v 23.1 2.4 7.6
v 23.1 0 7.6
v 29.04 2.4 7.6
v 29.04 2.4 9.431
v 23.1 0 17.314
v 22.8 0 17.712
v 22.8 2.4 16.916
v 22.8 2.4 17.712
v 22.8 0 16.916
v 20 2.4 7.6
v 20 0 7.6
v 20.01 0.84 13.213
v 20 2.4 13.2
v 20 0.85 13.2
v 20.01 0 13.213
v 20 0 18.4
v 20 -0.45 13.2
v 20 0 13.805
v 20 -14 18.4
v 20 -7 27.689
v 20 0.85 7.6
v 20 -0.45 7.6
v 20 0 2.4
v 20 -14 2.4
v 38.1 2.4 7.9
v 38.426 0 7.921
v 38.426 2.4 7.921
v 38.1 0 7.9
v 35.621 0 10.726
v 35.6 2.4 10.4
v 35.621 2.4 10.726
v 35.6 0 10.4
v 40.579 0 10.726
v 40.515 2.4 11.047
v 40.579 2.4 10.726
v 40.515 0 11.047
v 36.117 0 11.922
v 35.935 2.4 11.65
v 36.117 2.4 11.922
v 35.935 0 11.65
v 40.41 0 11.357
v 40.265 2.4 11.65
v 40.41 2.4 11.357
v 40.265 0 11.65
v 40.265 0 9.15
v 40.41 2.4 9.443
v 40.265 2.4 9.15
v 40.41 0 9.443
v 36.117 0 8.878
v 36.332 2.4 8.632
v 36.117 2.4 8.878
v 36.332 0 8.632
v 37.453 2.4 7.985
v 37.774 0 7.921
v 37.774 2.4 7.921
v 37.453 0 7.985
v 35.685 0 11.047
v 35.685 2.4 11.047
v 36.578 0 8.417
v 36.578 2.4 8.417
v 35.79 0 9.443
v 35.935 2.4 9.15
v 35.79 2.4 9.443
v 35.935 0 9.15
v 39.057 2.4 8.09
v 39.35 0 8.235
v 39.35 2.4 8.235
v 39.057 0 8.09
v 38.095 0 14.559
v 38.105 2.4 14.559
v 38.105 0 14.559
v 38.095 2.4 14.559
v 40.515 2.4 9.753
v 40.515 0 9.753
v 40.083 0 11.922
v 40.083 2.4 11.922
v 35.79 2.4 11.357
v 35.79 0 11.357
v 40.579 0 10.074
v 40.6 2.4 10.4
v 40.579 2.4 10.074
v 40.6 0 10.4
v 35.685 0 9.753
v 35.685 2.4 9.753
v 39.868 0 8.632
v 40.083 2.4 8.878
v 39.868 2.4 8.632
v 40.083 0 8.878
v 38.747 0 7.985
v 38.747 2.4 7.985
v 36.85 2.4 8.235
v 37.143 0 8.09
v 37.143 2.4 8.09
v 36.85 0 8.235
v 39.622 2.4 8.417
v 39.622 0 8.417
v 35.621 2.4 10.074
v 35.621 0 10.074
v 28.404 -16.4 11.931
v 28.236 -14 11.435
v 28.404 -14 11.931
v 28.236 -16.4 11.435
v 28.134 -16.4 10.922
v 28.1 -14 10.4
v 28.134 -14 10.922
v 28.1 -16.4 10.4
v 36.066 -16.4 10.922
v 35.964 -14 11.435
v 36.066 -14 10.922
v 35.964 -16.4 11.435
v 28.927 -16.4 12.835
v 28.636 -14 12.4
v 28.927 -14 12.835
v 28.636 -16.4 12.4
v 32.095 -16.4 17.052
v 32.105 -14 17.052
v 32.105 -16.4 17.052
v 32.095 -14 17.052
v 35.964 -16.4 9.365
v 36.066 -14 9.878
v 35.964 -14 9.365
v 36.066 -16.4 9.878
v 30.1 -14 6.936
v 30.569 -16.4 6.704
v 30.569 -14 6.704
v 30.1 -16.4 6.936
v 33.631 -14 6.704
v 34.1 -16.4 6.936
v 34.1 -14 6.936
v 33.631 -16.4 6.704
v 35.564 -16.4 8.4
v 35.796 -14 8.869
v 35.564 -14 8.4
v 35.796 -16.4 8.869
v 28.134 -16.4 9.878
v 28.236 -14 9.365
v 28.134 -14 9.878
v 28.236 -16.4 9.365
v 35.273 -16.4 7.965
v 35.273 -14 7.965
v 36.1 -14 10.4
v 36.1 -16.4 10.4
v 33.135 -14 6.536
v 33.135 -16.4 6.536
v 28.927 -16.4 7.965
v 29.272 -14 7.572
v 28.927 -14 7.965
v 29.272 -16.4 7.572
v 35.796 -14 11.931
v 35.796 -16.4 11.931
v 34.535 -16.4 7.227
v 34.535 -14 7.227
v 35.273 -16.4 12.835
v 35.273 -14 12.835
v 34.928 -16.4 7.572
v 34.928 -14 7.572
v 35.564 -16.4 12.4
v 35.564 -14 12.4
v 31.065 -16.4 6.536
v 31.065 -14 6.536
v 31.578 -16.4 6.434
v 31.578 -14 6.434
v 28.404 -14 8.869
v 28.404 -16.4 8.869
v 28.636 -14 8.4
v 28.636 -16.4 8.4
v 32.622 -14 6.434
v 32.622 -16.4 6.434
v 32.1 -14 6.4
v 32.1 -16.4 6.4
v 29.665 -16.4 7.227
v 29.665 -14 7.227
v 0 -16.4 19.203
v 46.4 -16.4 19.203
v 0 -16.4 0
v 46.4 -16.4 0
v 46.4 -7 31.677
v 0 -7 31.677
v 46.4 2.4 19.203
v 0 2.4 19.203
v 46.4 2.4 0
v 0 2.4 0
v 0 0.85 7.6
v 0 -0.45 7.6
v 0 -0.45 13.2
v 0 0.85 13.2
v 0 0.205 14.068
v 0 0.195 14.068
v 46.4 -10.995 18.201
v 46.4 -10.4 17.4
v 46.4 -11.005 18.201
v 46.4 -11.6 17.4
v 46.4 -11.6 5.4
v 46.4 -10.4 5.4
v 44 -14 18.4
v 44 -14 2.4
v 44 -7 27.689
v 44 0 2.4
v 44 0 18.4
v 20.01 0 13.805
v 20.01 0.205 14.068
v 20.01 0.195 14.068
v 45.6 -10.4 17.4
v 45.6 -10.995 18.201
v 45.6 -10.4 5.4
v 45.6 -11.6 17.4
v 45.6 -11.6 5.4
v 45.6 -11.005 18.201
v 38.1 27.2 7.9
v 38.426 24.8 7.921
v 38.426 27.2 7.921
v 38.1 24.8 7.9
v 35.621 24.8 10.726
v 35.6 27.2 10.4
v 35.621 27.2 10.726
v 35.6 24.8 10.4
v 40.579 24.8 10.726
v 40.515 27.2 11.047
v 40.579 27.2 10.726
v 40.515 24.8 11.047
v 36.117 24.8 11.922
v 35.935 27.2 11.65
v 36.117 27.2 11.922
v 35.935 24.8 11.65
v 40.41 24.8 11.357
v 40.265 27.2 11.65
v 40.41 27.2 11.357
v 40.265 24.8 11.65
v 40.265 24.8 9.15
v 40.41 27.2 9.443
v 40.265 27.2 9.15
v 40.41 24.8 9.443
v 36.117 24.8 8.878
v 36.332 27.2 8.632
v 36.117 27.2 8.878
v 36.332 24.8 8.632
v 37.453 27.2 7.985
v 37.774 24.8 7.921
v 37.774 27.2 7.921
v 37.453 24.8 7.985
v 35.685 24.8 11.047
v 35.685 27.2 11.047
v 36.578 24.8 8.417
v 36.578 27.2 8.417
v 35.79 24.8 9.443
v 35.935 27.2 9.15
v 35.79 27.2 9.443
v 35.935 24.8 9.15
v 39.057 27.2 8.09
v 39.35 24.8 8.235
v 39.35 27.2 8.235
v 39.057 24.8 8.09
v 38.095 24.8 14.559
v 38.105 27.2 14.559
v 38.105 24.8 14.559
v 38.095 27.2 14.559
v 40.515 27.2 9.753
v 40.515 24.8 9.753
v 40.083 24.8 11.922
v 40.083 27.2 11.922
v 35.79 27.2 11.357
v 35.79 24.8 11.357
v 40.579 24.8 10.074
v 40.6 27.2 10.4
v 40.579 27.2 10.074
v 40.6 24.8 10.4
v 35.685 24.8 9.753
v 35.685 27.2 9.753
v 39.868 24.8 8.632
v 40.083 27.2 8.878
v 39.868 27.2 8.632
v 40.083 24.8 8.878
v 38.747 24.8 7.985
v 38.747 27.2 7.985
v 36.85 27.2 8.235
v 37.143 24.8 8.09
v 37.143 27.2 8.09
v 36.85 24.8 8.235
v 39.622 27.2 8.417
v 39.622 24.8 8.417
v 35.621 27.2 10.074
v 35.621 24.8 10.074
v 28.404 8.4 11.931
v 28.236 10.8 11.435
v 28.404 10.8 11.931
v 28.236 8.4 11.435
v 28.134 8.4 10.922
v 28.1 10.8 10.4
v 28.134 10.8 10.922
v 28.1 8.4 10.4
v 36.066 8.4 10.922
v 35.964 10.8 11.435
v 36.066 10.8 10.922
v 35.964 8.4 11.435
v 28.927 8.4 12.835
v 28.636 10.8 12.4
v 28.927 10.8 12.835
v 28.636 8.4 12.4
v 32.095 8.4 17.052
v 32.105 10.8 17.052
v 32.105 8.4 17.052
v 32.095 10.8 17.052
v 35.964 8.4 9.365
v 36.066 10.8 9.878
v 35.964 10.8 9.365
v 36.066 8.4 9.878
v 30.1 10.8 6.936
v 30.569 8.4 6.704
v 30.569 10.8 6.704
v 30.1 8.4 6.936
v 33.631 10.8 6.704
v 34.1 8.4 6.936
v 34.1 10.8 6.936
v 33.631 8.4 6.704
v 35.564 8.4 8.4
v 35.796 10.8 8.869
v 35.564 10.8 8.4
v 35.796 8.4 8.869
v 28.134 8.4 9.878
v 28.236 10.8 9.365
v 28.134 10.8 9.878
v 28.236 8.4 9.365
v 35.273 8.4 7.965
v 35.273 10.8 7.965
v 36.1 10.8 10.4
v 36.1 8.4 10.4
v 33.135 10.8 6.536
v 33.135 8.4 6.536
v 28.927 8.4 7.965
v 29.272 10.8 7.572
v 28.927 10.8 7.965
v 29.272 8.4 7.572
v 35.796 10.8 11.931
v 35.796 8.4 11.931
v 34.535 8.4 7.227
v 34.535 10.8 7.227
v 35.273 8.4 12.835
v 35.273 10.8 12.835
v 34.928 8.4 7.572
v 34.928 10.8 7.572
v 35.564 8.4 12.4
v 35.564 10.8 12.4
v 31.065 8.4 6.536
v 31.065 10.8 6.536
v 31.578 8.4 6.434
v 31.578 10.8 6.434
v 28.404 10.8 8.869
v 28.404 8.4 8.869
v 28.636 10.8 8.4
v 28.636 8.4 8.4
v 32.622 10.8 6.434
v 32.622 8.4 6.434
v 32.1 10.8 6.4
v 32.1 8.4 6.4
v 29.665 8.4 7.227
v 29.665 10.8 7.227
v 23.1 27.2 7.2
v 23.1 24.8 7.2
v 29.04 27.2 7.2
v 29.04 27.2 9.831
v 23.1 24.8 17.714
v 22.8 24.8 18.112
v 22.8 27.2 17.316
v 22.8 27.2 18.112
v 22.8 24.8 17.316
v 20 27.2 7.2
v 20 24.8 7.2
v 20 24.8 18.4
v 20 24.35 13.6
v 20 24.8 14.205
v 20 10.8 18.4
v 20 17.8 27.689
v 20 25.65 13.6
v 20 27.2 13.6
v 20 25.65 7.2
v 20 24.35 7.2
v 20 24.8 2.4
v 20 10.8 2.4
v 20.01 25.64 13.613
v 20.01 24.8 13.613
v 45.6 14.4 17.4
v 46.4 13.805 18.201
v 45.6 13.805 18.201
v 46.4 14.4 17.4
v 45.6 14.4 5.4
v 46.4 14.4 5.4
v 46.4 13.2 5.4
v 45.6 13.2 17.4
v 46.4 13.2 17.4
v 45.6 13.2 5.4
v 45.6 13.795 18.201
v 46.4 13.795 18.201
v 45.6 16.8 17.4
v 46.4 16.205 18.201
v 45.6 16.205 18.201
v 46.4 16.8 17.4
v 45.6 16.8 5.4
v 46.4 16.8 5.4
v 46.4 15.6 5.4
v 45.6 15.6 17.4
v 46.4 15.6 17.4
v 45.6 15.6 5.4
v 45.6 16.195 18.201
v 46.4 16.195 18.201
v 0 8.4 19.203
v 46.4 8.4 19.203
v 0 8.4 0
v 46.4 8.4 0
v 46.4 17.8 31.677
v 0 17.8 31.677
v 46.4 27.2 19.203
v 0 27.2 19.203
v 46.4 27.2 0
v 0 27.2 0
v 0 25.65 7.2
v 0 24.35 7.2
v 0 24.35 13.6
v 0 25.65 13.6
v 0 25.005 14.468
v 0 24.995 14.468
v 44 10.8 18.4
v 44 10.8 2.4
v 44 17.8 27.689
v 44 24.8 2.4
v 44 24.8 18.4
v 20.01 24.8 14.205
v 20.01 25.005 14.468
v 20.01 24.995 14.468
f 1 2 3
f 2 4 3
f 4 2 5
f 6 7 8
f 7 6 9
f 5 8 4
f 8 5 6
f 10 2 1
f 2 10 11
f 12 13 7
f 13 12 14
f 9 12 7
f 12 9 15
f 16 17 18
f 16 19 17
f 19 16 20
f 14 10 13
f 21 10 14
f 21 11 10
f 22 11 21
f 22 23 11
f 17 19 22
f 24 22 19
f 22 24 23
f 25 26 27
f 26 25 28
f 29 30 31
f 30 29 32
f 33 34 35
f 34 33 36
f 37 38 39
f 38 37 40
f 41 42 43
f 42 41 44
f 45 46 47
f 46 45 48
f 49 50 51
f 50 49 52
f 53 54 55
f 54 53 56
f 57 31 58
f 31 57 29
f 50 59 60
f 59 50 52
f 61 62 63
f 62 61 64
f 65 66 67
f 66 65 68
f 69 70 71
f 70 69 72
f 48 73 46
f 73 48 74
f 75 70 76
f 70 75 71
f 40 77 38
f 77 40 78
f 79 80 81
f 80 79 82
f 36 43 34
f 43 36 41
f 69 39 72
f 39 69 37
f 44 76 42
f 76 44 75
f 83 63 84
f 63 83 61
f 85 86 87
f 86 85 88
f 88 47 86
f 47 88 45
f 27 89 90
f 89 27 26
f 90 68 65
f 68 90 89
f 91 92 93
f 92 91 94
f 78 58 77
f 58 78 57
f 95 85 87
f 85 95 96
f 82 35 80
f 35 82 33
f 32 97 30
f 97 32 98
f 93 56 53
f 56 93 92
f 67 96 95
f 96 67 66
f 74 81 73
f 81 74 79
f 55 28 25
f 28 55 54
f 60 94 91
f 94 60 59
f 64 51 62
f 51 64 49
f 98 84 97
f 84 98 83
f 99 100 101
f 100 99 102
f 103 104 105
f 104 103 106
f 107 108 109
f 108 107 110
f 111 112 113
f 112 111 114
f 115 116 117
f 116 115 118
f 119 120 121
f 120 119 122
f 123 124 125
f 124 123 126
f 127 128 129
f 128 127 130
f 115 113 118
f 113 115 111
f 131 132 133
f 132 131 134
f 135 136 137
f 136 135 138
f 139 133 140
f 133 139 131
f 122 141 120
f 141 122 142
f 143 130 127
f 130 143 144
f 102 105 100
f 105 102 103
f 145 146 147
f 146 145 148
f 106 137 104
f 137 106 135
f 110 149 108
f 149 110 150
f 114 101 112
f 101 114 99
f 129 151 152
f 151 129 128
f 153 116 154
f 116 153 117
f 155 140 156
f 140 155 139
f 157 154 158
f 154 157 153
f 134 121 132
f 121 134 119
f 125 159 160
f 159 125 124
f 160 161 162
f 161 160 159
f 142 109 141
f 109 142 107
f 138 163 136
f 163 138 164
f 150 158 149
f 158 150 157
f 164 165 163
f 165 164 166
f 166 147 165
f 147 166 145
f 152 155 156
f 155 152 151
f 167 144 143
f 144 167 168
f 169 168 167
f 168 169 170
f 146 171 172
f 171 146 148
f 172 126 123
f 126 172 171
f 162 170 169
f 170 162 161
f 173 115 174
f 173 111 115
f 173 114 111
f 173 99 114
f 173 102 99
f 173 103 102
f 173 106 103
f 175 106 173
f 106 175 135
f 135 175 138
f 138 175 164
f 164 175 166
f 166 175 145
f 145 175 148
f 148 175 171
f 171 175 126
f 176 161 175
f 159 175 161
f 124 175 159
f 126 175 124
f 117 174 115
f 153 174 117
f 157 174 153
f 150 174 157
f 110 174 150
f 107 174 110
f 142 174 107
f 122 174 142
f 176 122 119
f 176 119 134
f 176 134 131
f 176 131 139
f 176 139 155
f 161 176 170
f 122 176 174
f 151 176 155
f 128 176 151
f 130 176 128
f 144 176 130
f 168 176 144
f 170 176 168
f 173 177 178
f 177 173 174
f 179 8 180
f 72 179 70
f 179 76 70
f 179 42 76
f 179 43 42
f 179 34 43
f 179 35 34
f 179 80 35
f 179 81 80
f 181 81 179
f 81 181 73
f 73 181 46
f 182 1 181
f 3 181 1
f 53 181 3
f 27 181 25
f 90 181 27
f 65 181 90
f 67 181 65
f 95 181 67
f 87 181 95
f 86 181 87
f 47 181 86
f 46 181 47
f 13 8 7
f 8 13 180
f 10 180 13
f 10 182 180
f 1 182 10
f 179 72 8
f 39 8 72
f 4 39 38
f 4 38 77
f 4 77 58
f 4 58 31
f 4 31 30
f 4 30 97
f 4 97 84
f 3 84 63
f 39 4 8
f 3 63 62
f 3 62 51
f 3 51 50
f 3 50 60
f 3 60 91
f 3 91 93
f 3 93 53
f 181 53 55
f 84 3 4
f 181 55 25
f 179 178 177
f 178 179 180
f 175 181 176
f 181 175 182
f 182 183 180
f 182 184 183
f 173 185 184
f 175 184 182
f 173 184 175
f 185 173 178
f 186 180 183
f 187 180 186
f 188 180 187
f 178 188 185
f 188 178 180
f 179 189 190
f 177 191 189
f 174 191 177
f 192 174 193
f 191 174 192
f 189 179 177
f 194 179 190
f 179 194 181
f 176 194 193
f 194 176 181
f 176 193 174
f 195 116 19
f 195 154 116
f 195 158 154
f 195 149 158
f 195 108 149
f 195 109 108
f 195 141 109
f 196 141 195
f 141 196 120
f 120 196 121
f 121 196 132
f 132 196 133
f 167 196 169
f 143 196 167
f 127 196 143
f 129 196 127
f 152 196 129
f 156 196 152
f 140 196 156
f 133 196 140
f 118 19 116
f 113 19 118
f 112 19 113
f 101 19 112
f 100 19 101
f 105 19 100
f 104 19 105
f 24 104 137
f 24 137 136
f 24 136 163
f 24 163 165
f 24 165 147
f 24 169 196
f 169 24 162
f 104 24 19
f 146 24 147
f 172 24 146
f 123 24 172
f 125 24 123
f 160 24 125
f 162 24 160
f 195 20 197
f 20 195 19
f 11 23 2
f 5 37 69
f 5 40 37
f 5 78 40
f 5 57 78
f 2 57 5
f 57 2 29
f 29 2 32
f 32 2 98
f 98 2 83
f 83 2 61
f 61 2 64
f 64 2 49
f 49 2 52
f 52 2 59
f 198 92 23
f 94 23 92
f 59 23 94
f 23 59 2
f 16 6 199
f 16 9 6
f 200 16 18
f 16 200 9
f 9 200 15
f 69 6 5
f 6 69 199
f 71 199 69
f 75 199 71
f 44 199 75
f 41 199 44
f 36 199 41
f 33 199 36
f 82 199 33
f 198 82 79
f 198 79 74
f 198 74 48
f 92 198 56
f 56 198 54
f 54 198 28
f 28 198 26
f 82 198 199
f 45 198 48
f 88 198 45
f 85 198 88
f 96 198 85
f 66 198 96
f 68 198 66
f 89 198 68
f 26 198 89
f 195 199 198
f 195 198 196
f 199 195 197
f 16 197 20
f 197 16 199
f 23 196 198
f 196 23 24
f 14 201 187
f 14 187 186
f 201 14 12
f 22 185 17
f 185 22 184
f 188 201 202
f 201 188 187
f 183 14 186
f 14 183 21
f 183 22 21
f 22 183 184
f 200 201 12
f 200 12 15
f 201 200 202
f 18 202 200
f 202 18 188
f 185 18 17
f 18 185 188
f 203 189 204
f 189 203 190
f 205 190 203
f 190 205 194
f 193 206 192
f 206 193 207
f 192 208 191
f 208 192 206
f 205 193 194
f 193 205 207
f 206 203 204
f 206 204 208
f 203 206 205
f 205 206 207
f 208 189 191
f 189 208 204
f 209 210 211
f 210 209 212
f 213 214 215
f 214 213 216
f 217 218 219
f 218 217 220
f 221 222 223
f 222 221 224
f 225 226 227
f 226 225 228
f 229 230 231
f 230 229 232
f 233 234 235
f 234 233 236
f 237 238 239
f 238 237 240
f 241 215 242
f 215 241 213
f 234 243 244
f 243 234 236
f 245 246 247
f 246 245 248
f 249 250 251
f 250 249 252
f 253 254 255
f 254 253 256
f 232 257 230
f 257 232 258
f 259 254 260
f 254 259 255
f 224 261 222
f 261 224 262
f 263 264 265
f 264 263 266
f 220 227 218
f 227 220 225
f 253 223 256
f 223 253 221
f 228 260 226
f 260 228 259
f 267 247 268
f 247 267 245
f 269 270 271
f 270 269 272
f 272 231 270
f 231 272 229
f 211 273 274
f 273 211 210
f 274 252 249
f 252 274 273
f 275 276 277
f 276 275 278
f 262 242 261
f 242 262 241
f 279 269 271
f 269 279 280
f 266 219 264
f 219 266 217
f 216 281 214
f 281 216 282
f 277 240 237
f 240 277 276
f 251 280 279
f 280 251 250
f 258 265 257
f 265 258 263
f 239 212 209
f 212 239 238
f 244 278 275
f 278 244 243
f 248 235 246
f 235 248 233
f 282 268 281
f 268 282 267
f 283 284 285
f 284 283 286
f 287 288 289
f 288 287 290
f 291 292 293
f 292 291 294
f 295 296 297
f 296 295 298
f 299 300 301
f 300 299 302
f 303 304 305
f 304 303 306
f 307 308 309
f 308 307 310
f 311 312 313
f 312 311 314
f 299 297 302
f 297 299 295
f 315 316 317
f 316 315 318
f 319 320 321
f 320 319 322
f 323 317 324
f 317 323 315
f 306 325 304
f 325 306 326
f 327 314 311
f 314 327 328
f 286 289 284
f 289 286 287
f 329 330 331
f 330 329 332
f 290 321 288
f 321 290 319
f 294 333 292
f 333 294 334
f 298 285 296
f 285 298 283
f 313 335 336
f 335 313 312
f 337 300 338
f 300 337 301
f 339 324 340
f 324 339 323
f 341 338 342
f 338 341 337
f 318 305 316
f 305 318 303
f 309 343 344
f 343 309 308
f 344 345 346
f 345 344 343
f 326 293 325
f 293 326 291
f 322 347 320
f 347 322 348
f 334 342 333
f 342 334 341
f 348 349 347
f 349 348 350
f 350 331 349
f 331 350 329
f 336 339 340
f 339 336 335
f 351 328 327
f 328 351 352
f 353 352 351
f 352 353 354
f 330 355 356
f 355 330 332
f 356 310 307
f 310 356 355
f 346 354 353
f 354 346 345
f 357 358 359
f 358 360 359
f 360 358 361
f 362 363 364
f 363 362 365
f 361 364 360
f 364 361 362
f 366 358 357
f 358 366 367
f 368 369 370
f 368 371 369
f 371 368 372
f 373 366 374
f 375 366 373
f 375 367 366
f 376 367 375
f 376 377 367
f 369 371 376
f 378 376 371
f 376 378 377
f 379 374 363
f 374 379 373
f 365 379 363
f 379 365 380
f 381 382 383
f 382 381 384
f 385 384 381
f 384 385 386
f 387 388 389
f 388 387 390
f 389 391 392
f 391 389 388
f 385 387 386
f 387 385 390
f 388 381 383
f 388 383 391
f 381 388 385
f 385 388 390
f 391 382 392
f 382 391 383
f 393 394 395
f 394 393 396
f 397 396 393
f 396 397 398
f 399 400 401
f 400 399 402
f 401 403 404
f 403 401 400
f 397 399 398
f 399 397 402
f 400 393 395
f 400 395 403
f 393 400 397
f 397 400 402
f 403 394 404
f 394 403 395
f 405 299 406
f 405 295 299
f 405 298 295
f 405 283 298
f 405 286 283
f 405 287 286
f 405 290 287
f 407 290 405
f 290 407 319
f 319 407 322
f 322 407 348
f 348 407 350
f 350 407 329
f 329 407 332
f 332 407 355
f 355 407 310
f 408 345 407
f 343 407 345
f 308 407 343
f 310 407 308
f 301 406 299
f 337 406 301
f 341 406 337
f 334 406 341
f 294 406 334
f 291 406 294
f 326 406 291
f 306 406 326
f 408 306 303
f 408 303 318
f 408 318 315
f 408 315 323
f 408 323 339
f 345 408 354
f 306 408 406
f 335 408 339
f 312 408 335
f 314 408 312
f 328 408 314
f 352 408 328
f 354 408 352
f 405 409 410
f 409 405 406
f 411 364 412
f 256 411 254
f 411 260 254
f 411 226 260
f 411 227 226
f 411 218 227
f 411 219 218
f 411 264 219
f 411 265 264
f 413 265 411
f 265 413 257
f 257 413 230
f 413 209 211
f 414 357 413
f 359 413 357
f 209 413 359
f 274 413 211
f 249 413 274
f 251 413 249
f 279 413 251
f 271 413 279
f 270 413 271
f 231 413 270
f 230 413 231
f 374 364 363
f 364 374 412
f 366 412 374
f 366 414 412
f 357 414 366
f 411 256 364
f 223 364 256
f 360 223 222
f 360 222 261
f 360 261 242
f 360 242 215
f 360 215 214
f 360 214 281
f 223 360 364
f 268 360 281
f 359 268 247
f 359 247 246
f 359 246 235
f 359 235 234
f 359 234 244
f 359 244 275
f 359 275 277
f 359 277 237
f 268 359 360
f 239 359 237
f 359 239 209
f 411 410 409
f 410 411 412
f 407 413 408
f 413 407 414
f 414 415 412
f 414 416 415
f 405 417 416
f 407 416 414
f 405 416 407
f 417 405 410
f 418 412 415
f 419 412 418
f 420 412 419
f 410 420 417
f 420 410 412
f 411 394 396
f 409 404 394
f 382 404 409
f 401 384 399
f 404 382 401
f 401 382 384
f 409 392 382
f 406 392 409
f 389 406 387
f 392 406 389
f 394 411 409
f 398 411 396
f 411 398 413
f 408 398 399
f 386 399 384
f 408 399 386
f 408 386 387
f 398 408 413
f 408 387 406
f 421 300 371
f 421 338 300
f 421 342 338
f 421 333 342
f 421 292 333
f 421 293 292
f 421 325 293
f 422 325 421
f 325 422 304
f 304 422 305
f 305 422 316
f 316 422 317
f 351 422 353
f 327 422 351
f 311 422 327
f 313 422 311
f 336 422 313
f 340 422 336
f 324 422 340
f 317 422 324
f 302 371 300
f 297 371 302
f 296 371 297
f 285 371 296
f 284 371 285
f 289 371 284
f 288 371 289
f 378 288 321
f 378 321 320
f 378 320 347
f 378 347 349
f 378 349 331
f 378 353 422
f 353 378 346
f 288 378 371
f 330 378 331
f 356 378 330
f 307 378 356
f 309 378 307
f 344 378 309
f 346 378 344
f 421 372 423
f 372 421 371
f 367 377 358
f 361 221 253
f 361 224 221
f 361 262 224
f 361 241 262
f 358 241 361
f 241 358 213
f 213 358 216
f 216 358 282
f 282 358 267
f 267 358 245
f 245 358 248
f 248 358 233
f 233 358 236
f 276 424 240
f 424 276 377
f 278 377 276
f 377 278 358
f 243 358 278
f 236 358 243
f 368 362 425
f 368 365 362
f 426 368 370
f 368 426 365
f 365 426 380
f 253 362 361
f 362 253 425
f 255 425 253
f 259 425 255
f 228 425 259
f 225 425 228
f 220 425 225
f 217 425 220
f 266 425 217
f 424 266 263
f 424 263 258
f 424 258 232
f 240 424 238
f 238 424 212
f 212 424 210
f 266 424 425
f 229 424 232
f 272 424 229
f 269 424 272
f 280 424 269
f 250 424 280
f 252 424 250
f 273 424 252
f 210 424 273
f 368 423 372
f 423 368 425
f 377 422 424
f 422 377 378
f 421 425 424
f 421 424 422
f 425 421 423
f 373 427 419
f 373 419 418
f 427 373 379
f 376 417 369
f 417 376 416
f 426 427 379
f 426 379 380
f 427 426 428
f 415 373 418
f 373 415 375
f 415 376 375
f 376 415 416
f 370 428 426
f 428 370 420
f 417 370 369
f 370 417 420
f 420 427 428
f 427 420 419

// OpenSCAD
// Ocarina voicing whistle v2 (2026-11-19): a narrower window. Scott said yes to one more test.
// Whistle 2 of v1 (windway 1.3 mm) measured a window term of 4.88 mm (twice, from Scott's two
// recordings), and with the hole end correction measured at 2.1-2.5, the 12-hole ocarina's
// two thumb holes came out 11.1 and 13.5 mm: too big for a finger (BRIEF.md). Every hole
// scales with the window term, and 3.5 mm brings every hole under 10.5. The window term is
// set by the jet's width, so these two whistles narrow it, everything else as v1 whistle 2:
//   one notch: jet 5.6 mm wide (v1: 8.0), about 30% narrower, aiming at a window term of 3.4
//   two notches: jet 6.4 mm, about 20% narrower, aiming at 3.9
// The windway is 1.3 mm (Scott's pick of v1). The same three notes give the measurement.
//
// Ocarina voicing whistle (2026-11-12): the test print before the ocarina (Scott's form
// A, a 12-hole Alto C). The labium edge and windway decide whether an ocarina sounds at
// all, and they are what the printer is most likely to spoil; two constants in the
// tuning (ocarina_budget.py) can only be measured on a real print. So this whistle has
// the instrument's real voicing and two finger holes. Blow it with a tuner: the three
// notes (closed, the small hole open, both open) give the window term and the hole end
// correction, and the full ocarina's hole sizes come from them.
//
// How it prints, and so how the ocarina will: lying on its side, the air flowing along
// the plate (+x), the windway an upright slot 8 mm tall.
//   - The labium edge stands upright and builds bead on bead, its ramp an upright face.
//     Stood on its mouthpiece (the first draft), the edge's first layer was an 8 mm
//     sliver across the window, and the gate's slicer propped it from the plate, up
//     through the windway itself.
//   - The windway's roof is its 1 mm width, not a bridge.
//   - The chamber's roof is a gable 37 deg from upright, so nothing inside needs support.
//   - Finger holes go through upright walls, so they are teardrops pointing up; the
//     ocarina's will be too, so what this measures carries over.
//
// Two whistles, differing only in the windway's height (here its thickness in y): one
// notch = 1.0 mm, two = 1.3 mm.
//   part = "both" | "whistle" (with variant 0/1)
// Millimetres; x the air's way, y toward the front (the window side), z up.

part = "both";
variant = 0;
$fn = 48;

WWS  = [5.6, 6.4];        // jet width (the windway's and window's upright size): the v2 variable
WHS  = [1.3, 1.3];        // windway height (across, in y): v1's whistle 2, for both
WL   = 20;                // windway length = the mouthpiece
WIN_PRINT = 4.0;          // window as printed: windway exit to labium edge
EDGE_LOSS = 0.9;          // the wedge's tip, thinner than a bead, doesn't print: the print
                          // fidelity check measured 0.9 mm of it dropped along the air's line
WIN  = WIN_PRINT - EDGE_LOSS;   // so the model's edge is drawn that much early
LAB  = 22;                // labium wedge angle: the ramp leans this far off the air's line
OFF  = 0.2;               // labium edge this much inside the windway's centre line
T    = 2.4;               // walls (Benson's spec)
ROOF = 37;                // the chamber's roof and the holes' points, deg from upright
CL = 24; CD = 14; CH = 16;  // chamber inside: along the air, deep (y), tall to the eaves (z)
                            // (30 x 16 x 24 took 1 h 10 m for the pair: smaller, the voicing unchanged)
Z0 = T;                     // chamber floor
ZC = Z0 + CH / 2;           // window and windway centre height
function ww(v) = WWS[v];
function win_top(v) = ZC + ww(v) / 2 + WIN / tan(ROOF);   // the window's top at the labium edge
HOLES = [[5.0, 15, 1], [8.0, 9, -1]];   // [diameter, x past the labium, face +y/-y]: the small one
                                         // on the front past the ramp, the big one on the back

function wh(v) = WHS[v];
// a w x h rectangle centred on the origin with a 37 deg point on top (in 2D, up = +y)
module pointed(wh_) hull() { square(wh_, center = true); translate([0, wh_[1] / 2 + (wh_[0] / 2) / tan(ROOF)]) square(0.01, center = true); }
module teardrop2d(d) hull() { circle(d = d); translate([0, d / 2 / sin(ROOF)]) square(0.01, center = true); }
// the chamber's cross-section (y, z): a box with a gable roof
module prof() polygon([[-CD, Z0], [0, Z0], [0, Z0 + CH], [-CD / 2, Z0 + CH + (CD / 2) / tan(ROOF)], [-CD, Z0 + CH]]);
module along(x0, x1) translate([x0, 0, 0]) rotate([90, 0, 90]) linear_extrude(x1 - x0) children();

module whistle(v) difference() {
    // the body: the chamber's section grown by T, from the mouthpiece to the far end
    along(0, WL + CL + T) offset(delta = T) prof();
    along(WL, WL + CL) prof();
    // windway: an upright slot from the mouthpiece end to the window, its top pointed
    // (37 deg): a flat 1.3 mm roof drew support up the slot itself
    along(-1, WL + 0.01) translate([OFF, ZC]) pointed([wh(v), ww(v)]);
    // Window and labium cut together. Their top is one pointed arch peaking over the
    // labium edge: the window's top rises 37 deg from upright toward the edge and the ramp
    // cut's top falls away from it. Each a flat top, or the two sloping toward each other,
    // left a dip at the edge where the wall above began as one bead over air, and the
    // gate's slicer propped it from the plate, up through the windway. The window is so
    // taller at the edge (win_top) than the jet: that only adds to the window term
    // the whistle measures, and the ocarina copies this voicing exactly.
    union() {
        // window: through the front wall, open to the chamber behind
        translate([0, T + 1, 0]) rotate([90, 0, 0]) linear_extrude(T + 2)
            polygon([[WL, ZC - ww(v) / 2], [WL + WIN, ZC - ww(v) / 2], [WL + WIN, win_top(v)], [WL, ZC + ww(v) / 2]]);
        // labium: past the window the front wall's inside face is the line y = 0, and its
        // outside is cut back so the wall thickens from nothing at the edge, LAB deg off
        // the air's line
        intersection() {
            translate([WL + WIN, 0, ZC - ww(v) / 2]) linear_extrude(ww(v) + 30)
                // starting 0.3 inside the window: sharing its face left the mesh non-manifold
                polygon([[-0.3, -1], [0, 0], [(T + 1) / tan(LAB), T + 1], [-0.3, T + 1]]);
            translate([WL + WIN, -10, win_top(v)]) rotate([0, 90 - ROOF, 0]) translate([-50, 0, -100]) cube([150, 20, 100]);
        }
    }
    // finger holes through the front and back walls, across the print
    for (h = HOLES) translate([WL + WIN + h[1], h[2] > 0 ? T / 2 : -CD - T / 2, ZC])
        rotate([90, 0, 0]) linear_extrude(T + 2, center = true) teardrop2d(h[0]);
    // variant notches across the far end, 0.8 deep (at 1.4 they left a 1.0 wall), upright
    // grooves with pointed tops: one = the 5.6 mm jet,
    // two = 6.4
    for (k = [0 : v]) translate([WL + CL + T + 1.2, -CD + 3 + k * 2.4, Z0 + 3]) rotate([90, 0, -90])
        linear_extrude(2) hull() { translate([-0.6, 0]) square([1.2, 12]); translate([0, 12 + 0.6 / tan(ROOF)]) square(0.01, center = true); }
}

// the labium wedge, declared to the gate as deliberately thin (the sound edge itself),
// for both whistles as laid out in "both"
module labium_zone() for (v = [0 : 1]) translate([0, v * (CD + 2 * T + 6), 0])
    translate([WL + WIN - 0.5, -0.5, ZC - ww(v) / 2 - 0.5]) cube([(T + 1) / tan(LAB) + 1, T + 1, win_top(v) - ZC + ww(v) / 2 + 1]);

if (part == "whistle") whistle(variant);
else if (part == "labium_zone") labium_zone();
else for (v = [0 : 1]) translate([0, v * (CD + 2 * T + 6), 0]) whistle(v);
